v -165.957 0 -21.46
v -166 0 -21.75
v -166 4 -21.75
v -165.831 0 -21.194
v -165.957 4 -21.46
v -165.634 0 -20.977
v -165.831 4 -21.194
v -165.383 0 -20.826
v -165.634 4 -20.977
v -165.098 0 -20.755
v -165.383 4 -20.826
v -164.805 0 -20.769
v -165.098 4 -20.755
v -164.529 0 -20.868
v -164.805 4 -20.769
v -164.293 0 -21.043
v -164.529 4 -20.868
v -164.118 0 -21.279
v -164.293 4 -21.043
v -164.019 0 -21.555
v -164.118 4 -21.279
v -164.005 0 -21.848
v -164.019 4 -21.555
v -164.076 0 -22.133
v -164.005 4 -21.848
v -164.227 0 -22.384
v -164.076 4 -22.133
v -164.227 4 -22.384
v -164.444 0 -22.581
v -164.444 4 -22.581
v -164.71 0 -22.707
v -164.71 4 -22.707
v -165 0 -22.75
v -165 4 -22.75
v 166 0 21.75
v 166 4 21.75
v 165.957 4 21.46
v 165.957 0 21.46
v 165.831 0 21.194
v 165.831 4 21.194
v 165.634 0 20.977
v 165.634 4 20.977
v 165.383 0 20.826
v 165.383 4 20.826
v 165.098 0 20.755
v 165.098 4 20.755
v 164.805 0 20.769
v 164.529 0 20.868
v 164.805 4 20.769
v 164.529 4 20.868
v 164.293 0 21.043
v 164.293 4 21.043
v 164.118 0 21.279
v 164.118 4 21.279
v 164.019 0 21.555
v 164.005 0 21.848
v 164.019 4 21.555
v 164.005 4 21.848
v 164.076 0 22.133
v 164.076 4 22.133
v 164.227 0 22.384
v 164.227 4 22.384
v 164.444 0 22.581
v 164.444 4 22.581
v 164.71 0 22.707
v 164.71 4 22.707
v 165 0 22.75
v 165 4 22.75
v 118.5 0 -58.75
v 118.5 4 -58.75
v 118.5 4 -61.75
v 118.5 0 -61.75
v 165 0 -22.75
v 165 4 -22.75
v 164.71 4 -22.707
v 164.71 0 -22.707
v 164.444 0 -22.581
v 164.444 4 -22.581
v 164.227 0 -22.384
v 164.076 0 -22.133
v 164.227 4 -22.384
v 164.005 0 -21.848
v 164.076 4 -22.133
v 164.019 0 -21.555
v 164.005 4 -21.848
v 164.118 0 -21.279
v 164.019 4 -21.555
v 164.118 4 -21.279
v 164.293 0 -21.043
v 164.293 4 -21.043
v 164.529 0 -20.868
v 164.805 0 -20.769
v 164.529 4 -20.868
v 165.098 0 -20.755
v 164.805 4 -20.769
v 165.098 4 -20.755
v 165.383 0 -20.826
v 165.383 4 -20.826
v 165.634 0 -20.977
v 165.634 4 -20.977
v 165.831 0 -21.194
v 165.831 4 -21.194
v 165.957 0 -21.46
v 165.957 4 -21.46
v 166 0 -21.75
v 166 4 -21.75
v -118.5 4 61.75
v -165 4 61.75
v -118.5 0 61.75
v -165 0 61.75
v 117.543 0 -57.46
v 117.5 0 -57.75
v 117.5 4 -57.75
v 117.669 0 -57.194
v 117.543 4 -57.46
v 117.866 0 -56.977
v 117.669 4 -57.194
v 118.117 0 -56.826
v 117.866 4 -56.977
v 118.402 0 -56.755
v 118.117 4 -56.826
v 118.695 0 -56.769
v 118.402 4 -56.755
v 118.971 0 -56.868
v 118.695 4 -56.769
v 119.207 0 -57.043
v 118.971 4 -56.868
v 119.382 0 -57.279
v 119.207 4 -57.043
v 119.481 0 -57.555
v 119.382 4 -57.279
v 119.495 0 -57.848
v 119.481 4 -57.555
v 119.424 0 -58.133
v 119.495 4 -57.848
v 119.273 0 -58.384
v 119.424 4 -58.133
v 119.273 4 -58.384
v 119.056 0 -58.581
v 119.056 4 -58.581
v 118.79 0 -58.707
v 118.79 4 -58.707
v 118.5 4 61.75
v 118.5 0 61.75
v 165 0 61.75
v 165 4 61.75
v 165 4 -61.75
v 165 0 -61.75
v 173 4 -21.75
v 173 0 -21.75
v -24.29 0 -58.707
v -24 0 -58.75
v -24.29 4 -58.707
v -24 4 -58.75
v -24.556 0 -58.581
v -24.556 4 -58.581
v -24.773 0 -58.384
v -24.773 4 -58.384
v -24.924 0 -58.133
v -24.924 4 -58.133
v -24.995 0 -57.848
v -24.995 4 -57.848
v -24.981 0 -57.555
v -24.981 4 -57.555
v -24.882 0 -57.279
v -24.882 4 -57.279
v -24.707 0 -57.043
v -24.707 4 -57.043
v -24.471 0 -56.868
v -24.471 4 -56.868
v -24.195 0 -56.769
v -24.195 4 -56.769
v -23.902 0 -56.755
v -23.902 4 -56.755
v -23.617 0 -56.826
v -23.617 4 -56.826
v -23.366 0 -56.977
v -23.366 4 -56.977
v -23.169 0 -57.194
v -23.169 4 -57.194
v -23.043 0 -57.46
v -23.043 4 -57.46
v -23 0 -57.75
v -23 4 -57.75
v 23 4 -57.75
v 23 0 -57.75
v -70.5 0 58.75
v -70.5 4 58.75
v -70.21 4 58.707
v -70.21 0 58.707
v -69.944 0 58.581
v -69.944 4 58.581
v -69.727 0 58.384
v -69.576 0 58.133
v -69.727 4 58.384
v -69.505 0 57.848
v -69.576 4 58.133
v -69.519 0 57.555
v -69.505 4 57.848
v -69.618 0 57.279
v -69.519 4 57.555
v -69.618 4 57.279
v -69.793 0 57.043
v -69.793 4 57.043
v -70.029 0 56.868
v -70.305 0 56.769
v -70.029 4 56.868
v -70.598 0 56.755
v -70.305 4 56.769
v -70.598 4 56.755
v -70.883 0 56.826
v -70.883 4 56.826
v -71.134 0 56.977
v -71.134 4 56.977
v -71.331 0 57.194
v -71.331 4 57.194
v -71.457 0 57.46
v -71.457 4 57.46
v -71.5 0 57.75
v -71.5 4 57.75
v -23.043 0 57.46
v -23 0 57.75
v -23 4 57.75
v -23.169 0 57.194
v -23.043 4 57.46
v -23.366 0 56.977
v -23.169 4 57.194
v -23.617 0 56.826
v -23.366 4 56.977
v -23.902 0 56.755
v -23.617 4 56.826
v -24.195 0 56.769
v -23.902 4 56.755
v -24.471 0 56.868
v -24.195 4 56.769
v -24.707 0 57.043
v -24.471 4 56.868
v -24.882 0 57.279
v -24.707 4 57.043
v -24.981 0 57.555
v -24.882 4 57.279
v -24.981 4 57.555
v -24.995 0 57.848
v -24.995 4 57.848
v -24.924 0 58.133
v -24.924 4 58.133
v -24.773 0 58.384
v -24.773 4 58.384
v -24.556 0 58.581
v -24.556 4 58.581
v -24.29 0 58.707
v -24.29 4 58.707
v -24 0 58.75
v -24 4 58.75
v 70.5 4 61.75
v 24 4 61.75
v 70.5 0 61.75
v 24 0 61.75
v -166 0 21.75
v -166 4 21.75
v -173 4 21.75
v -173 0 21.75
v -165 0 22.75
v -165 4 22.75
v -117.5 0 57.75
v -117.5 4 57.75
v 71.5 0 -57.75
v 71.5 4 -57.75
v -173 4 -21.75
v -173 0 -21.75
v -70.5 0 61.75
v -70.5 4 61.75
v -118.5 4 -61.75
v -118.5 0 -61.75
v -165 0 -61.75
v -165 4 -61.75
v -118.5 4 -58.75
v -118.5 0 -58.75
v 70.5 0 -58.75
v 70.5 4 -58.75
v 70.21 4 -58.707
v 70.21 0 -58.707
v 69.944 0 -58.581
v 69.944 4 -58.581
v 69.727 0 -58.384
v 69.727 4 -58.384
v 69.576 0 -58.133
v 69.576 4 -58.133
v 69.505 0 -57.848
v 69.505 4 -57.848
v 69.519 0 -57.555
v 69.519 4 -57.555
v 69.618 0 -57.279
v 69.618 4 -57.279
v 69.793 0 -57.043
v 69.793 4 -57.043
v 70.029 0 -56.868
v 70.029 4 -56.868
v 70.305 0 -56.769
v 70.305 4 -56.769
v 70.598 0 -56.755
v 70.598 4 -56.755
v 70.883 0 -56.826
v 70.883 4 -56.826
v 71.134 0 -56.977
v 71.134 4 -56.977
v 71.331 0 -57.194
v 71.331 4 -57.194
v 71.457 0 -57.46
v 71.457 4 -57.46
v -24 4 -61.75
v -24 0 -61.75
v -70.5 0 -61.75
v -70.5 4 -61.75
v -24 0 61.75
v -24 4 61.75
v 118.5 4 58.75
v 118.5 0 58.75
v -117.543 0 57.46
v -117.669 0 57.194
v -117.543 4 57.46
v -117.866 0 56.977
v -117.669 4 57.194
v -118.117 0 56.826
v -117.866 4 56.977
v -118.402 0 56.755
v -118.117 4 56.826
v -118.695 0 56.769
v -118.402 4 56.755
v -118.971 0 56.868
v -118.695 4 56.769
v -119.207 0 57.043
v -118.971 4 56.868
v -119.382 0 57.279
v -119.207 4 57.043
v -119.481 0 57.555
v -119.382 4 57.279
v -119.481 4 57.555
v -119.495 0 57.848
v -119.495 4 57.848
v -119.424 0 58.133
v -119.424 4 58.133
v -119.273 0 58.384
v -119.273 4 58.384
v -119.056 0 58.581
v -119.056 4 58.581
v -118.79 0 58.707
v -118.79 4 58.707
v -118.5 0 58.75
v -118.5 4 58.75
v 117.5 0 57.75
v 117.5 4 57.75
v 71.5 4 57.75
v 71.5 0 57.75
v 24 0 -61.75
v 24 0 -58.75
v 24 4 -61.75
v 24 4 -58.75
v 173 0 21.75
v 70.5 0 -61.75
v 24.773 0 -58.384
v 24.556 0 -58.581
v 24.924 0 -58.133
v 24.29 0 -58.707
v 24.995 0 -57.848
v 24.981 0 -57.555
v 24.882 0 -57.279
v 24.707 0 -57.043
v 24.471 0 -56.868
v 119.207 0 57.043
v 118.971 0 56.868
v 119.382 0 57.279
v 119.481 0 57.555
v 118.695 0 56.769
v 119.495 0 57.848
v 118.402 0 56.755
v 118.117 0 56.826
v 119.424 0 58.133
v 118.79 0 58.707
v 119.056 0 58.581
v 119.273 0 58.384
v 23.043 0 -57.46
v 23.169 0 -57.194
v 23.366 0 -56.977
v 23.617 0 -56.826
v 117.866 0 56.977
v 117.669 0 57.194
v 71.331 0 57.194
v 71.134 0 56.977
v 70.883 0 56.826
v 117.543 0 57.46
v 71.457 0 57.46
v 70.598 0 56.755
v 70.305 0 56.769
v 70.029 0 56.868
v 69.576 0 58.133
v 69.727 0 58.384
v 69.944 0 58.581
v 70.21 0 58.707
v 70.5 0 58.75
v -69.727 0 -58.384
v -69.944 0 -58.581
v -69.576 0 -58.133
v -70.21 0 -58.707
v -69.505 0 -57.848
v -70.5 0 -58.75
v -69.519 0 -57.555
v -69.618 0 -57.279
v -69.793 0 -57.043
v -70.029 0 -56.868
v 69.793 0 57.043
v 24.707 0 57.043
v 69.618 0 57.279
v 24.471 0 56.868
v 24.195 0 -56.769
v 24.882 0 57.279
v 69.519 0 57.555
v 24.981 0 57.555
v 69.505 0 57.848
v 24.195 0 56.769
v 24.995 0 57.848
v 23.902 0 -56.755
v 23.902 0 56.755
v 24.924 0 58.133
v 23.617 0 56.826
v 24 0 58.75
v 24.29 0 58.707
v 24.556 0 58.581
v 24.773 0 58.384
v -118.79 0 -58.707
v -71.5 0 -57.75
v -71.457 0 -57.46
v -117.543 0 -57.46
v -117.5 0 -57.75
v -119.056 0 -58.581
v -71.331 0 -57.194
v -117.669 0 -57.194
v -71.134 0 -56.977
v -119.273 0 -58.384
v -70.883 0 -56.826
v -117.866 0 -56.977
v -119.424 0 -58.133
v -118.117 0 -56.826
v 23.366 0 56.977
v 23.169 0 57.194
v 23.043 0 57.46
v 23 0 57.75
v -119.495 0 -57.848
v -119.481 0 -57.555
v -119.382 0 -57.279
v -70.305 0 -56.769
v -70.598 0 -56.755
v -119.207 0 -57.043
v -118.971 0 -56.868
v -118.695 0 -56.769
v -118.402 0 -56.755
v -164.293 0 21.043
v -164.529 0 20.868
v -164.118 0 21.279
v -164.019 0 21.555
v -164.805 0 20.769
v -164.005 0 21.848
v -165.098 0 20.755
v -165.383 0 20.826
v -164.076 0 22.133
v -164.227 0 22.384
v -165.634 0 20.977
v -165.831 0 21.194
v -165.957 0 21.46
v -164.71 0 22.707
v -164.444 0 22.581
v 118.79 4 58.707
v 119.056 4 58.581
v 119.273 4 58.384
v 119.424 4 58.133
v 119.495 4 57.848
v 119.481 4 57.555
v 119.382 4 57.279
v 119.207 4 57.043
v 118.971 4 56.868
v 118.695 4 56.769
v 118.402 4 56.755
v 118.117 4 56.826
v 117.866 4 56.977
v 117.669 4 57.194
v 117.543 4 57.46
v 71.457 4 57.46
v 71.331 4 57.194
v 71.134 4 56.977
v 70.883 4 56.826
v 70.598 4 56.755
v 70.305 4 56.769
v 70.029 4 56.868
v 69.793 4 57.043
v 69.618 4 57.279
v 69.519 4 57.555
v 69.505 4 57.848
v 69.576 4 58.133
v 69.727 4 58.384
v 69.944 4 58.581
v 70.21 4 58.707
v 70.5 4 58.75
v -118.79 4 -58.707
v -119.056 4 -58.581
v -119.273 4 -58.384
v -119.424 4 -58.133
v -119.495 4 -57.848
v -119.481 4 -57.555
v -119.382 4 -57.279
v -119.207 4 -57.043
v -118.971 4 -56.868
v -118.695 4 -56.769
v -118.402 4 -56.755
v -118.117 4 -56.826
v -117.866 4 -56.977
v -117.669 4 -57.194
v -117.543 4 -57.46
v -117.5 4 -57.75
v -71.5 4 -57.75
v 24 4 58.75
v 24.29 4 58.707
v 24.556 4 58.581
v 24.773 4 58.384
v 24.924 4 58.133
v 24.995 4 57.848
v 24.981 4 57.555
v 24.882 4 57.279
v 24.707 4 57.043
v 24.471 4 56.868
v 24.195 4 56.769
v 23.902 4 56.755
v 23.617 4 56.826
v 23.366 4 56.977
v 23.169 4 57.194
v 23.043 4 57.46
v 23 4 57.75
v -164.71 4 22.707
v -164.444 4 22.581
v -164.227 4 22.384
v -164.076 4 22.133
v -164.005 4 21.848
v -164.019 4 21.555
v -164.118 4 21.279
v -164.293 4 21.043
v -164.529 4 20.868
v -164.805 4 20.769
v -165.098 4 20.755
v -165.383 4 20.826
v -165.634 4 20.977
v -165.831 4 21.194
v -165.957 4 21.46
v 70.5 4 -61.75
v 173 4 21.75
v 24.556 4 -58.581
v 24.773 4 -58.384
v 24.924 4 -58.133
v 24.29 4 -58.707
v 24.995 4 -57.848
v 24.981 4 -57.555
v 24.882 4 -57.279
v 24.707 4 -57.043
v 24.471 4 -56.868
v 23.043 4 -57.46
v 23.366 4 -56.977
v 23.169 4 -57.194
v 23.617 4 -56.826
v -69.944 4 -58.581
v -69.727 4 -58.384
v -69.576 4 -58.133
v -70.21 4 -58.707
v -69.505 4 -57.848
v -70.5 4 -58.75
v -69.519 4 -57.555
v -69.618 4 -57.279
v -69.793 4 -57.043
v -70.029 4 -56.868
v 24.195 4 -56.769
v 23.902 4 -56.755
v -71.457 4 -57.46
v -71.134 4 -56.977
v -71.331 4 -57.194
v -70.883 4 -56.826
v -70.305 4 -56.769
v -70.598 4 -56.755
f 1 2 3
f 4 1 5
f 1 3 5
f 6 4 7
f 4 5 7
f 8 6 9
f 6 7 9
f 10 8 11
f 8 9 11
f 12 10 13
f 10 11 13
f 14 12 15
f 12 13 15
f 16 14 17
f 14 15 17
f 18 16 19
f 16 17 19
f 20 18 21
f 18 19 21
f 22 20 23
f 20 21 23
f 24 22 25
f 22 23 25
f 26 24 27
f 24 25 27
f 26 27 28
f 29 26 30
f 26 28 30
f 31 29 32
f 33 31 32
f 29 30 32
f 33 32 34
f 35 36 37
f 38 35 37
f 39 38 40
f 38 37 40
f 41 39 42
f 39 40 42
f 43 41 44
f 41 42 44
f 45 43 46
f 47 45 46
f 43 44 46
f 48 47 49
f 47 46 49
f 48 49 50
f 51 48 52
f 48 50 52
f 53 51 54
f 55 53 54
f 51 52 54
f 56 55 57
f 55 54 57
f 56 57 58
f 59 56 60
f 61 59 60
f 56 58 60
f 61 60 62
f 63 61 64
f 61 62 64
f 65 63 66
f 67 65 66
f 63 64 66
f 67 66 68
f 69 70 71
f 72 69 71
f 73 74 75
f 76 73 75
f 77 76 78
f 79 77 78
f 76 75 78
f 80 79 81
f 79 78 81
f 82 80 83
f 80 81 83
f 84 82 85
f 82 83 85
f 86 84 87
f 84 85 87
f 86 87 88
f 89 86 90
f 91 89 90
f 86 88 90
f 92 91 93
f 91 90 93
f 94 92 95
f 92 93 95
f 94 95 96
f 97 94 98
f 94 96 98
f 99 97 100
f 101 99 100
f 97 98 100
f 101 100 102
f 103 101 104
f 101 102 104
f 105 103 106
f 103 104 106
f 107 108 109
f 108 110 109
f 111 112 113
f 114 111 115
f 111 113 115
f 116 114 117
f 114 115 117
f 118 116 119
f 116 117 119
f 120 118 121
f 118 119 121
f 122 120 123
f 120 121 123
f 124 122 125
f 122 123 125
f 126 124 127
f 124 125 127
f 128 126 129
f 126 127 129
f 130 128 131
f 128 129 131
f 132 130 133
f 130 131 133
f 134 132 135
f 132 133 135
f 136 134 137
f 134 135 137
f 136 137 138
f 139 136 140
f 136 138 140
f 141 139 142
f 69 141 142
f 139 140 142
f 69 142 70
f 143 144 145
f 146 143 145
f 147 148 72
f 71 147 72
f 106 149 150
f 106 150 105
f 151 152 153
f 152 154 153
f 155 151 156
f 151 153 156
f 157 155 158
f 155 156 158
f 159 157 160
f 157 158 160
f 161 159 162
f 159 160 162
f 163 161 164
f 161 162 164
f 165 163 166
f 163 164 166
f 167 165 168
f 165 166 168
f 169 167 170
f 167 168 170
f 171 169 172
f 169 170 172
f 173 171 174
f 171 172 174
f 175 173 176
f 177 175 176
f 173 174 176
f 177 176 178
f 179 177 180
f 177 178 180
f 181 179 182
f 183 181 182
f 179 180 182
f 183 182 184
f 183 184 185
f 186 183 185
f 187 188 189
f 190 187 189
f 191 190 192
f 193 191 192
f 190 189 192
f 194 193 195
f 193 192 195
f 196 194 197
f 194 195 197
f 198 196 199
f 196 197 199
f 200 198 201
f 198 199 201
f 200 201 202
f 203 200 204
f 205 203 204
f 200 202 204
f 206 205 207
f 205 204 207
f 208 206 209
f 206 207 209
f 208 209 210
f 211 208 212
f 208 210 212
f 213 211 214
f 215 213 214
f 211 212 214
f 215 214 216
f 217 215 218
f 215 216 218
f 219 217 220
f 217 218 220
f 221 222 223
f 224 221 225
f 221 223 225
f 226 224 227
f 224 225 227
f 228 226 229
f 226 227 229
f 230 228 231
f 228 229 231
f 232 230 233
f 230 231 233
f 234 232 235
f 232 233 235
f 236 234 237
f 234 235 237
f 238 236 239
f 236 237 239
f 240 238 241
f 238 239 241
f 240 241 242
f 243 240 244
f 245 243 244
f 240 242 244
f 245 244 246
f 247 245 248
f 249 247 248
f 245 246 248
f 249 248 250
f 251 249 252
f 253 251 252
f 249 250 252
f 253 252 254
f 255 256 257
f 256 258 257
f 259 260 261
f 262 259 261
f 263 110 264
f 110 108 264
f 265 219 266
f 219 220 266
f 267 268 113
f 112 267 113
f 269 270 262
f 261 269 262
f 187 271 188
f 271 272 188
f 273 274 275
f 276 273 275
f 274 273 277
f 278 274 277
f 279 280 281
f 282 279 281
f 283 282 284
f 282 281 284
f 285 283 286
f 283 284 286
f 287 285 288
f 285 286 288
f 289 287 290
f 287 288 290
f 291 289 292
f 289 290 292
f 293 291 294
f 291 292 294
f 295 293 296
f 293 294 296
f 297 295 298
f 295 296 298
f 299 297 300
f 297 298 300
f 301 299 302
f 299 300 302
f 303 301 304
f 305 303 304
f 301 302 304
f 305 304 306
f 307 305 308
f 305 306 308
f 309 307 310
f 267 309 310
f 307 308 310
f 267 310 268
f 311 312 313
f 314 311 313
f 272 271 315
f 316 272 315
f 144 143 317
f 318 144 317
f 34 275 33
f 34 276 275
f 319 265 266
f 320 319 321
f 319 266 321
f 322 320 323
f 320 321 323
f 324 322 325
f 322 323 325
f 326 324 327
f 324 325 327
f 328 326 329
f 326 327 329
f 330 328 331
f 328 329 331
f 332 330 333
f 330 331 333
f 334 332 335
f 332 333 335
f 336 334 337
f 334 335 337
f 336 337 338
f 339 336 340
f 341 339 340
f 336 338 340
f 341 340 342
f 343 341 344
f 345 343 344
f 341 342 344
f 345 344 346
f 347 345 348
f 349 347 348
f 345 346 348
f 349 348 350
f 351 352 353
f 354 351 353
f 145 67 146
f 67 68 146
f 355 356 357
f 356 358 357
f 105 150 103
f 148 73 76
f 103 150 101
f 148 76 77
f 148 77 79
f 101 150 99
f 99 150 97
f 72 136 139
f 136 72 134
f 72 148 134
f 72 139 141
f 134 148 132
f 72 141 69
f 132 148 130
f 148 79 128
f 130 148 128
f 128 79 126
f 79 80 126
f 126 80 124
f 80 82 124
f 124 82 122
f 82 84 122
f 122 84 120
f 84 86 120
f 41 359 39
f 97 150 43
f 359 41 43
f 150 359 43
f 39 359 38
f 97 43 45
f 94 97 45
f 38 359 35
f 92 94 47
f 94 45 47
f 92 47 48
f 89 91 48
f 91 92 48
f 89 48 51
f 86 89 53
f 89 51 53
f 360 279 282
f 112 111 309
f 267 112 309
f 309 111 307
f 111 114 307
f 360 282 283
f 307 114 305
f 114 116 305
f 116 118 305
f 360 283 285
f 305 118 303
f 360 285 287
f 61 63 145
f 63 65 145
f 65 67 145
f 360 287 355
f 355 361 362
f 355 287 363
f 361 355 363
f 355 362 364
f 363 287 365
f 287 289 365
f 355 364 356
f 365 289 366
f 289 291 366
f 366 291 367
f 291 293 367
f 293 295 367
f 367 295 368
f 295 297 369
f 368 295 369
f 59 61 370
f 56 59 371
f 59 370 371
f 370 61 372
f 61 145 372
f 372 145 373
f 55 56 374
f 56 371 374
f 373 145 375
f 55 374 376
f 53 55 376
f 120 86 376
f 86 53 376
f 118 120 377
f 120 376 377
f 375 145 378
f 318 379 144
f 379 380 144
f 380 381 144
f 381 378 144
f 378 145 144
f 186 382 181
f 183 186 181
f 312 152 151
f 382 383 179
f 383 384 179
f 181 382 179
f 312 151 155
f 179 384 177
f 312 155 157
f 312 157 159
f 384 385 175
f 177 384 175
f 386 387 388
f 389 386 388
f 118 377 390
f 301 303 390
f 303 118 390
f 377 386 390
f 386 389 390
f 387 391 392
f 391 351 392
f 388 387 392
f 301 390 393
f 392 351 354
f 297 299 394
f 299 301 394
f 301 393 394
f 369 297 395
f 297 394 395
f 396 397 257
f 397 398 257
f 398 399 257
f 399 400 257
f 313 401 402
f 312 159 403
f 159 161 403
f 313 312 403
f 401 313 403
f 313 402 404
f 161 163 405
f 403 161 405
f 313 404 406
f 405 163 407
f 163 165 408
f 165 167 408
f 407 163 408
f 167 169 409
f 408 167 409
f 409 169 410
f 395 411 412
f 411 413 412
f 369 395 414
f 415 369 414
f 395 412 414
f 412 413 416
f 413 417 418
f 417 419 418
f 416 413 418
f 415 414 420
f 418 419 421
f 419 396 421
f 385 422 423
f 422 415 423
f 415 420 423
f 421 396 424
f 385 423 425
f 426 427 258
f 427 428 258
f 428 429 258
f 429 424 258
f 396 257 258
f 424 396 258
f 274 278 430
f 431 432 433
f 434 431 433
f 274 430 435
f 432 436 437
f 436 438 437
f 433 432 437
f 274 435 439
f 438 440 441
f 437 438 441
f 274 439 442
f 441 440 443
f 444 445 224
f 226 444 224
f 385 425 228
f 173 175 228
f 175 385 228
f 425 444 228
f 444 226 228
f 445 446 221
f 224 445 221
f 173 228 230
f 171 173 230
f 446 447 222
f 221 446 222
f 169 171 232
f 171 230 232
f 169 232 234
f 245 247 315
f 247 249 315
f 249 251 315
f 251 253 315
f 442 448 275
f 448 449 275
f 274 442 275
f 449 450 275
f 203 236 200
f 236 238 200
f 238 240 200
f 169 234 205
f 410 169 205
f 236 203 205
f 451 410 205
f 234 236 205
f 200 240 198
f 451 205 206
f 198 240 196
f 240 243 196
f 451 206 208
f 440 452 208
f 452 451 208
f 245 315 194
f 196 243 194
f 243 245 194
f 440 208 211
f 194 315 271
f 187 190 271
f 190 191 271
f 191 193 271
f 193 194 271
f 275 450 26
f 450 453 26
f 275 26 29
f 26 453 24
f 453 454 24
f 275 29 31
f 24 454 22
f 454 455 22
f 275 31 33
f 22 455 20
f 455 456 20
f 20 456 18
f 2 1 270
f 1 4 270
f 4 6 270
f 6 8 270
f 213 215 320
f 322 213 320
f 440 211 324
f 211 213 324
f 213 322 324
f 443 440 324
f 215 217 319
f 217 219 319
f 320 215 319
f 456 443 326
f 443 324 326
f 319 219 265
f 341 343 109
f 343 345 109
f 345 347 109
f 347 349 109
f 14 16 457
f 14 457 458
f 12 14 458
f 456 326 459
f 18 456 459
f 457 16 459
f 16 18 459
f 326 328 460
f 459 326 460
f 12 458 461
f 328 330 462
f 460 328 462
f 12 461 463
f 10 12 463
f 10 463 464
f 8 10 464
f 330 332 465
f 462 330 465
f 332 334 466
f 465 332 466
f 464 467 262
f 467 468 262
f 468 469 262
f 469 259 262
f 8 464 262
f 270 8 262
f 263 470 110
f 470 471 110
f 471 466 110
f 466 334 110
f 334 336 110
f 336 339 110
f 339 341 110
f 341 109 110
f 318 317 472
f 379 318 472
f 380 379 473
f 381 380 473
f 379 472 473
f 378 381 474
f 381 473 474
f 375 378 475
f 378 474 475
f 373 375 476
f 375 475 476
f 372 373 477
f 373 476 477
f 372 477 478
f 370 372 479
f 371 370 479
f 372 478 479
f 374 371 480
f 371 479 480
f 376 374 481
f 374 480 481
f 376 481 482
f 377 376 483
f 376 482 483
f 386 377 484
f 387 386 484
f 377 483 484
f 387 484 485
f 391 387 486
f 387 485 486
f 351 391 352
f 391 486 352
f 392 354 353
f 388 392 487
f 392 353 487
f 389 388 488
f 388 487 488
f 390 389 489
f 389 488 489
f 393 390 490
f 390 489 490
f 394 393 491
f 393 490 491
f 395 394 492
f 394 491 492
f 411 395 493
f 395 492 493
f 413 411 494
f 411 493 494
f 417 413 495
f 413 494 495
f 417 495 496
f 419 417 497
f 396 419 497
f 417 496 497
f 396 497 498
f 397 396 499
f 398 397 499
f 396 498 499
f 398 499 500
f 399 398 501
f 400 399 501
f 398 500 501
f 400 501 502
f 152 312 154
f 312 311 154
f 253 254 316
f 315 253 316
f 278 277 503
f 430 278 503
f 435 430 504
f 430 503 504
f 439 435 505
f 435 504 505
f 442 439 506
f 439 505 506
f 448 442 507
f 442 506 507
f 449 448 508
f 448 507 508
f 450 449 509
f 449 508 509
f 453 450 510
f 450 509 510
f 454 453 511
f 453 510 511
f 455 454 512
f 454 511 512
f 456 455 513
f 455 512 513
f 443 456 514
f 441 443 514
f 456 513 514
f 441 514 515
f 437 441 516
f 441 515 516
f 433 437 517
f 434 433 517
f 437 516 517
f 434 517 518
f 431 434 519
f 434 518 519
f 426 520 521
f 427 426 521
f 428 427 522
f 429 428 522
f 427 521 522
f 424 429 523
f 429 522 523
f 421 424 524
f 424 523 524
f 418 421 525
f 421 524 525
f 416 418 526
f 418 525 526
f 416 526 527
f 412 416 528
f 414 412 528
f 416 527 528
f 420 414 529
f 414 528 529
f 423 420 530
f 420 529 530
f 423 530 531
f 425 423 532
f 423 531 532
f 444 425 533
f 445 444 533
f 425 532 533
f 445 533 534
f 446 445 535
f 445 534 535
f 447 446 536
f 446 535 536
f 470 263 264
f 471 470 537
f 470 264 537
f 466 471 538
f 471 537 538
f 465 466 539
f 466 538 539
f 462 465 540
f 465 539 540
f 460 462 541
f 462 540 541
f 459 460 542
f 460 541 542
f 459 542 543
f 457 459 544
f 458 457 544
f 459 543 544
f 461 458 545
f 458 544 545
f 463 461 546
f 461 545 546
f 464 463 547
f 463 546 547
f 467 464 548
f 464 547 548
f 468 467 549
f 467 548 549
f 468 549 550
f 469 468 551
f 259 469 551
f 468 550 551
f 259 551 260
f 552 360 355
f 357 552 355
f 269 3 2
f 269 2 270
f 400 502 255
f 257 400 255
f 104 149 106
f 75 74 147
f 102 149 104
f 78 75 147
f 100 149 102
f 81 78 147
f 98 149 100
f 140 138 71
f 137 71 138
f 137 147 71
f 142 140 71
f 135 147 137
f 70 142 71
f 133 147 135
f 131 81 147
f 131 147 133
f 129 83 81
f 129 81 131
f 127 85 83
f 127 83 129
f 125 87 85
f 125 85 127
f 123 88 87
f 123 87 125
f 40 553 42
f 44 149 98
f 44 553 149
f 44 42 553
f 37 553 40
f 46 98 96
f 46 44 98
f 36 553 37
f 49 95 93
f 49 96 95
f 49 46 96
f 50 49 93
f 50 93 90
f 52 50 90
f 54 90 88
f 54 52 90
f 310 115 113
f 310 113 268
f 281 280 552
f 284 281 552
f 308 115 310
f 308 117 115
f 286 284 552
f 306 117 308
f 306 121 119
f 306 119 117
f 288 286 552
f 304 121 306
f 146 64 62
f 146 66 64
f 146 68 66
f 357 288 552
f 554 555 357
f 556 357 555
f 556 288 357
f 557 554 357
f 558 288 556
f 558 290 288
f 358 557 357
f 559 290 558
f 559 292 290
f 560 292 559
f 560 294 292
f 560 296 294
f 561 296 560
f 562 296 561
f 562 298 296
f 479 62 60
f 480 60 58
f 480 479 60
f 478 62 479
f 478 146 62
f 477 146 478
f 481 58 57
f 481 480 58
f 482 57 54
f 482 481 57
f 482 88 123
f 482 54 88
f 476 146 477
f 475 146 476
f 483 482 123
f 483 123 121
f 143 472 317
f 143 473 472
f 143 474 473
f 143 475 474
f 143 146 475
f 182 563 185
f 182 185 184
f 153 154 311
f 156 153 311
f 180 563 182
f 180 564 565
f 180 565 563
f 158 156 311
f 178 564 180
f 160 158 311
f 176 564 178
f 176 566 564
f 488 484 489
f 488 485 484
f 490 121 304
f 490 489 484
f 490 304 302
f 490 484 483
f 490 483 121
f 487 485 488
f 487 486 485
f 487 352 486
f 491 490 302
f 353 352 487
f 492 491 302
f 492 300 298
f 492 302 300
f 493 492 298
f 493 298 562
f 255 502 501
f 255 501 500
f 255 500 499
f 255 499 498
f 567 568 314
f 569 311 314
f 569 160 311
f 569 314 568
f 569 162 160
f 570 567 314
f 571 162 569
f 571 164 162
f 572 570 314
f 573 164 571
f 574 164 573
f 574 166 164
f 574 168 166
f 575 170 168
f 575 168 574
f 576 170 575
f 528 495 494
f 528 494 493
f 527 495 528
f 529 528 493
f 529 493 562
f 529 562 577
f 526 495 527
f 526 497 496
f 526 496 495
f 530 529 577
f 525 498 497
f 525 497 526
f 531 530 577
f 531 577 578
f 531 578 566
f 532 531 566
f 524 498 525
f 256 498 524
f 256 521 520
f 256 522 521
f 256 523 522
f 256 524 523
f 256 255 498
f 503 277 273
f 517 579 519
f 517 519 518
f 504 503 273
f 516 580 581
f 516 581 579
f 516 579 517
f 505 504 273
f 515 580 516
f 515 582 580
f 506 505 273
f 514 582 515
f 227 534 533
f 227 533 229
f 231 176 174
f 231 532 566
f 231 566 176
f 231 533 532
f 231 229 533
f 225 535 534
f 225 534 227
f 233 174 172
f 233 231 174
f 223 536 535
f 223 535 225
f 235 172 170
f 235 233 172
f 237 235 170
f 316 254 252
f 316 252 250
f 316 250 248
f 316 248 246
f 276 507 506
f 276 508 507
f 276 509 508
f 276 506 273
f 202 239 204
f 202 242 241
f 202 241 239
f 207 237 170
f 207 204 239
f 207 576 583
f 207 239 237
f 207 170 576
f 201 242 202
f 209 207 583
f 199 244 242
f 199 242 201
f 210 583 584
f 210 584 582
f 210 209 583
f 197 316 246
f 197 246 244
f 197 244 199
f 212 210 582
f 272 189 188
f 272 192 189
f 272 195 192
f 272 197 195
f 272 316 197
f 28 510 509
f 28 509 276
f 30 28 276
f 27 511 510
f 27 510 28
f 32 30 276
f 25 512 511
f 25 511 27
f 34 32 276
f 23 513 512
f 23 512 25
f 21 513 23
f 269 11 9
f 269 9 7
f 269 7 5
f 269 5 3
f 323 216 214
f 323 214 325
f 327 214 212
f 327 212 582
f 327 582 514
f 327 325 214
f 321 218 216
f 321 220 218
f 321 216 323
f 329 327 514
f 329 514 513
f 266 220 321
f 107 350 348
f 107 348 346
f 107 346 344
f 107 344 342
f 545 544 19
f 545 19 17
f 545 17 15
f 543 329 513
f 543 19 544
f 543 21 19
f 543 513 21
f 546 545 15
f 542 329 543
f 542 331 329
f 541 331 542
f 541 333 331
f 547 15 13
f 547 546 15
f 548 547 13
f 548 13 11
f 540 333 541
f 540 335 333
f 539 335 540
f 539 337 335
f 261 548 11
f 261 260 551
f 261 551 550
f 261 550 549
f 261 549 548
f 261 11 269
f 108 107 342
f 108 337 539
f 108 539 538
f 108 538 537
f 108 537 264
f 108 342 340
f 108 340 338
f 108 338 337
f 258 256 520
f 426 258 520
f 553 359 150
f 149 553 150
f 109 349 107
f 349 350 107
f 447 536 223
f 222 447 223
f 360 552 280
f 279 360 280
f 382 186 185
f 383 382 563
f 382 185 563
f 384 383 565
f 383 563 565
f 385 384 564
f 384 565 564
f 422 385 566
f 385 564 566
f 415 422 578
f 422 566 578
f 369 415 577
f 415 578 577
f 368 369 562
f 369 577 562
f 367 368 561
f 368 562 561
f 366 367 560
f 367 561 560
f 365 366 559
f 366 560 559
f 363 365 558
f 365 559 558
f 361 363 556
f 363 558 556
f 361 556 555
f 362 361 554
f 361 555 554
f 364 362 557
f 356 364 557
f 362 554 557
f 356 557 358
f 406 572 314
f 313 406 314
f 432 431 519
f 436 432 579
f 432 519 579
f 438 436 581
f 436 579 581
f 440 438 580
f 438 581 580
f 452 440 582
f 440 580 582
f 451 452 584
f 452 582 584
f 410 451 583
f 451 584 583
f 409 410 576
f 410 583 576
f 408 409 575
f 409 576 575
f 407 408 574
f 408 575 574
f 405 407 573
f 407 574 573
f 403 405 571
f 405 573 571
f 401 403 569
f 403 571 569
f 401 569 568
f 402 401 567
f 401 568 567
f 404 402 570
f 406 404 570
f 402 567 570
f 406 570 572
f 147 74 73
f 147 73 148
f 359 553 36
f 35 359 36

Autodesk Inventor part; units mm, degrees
ref_plane "YZ Plane" through (0, 0, 0) normal (1, 0, 0) x (0, 1, 0)
ref_plane "XZ Plane" through (0, 0, 0) normal (0, 1, 0) x (-1, 0, 0)
ref_plane "XY Plane" through (0, 0, 0) normal (0, 0, 1) x (1, 0, 0)
sketch "Sketch1" plane through (0, 0, 0) normal (0, 1, 0) x (-1, 0, 0)
  line L0 (173, 61.75) -> (-173, 61.75)
  line L1 (-173, 61.75) -> (-173, -61.75)
  line L2 (-173, -61.75) -> (173, -61.75)
  line L3 (173, -61.75) -> (173, 61.75)
  point P0 (0, 0)
  point P1 (0, -61.75)
  point P2 (173, 0)
  dimension "d0" = 346
  dimension "d1" = 123.5
extrude "Extrusion1" add sketch "Sketch1" along normal blind 4
sketch "Esboço2" plane through (0, 4, 0) normal (0, 1, 0) x (1, 0, 0)
  line L0 (173, 61.75) -> (-173, 61.75) projected
  line L1 (118.5, 61.75) -> (70.5, 61.75)
  line L2 (70.5, 61.75) -> (70.5, 57.75)
  line L3 (70.5, 57.75) -> (118.5, 57.75)
  line L4 (118.5, 57.75) -> (118.5, 61.75)
  line L5 (173, -61.75) -> (173, 61.75) projected
  line L6 (24, 61.75) -> (-24, 61.75)
  line L7 (-24, 61.75) -> (-24, 57.75)
  line L8 (-24, 57.75) -> (24, 57.75)
  line L9 (24, 57.75) -> (24, 61.75)
  line L10 (-70.5, 61.75) -> (-118.5, 61.75)
  line L11 (-118.5, 61.75) -> (-118.5, 57.75)
  line L12 (-118.5, 57.75) -> (-70.5, 57.75)
  line L13 (-70.5, 57.75) -> (-70.5, 61.75)
  circle A0 centre (24, 57.75) radius 1
  circle A1 centre (70.5, 57.75) radius 1
  circle A2 centre (-24, 57.75) radius 1
  circle A3 centre (-70.5, 57.75) radius 1
  circle A4 centre (-118.5, 57.75) radius 1
  circle A5 centre (118.5, 57.75) radius 1
  point P0 (0, 0)
  dimension "d4" = 48
  dimension "d5" = 4
  dimension "d6" = 54.5
  dimension "d7" = 48
  dimension "d8" = 46.5
  dimension "d9" = 48
  dimension "d10" = 46.5
  dimension "d11" = 2
  dimension "d12" = 2
  dimension "d13" = 2
  dimension "d14" = 2
  dimension "d15" = 2
  dimension "d16" = 2
extrude "Extrusão2" cut sketch "Esboço2" against normal blind 10
mirror "Espelhamento1" about plane through (0, 0, 0) normal (0, 0, 1) of "Extrusão2"
sketch "Esboço3" plane through (0, 4, 0) normal (0, 1, 0) x (1, 0, 0)
  line L0 (-118.5, 61.75) -> (-173, 61.75) projected
  line L1 (-173, 61.75) -> (-165, 61.75)
  line L2 (-165, 61.75) -> (-165, 21.75)
  line L3 (-165, 21.75) -> (-173, 21.75)
  line L4 (-173, 21.75) -> (-173, 61.75)
  line L5 (-173, 61.75) -> (-173, -61.75) projected
  line L6 (-173, -61.75) -> (-165, -61.75)
  line L7 (-165, -61.75) -> (-165, -21.75)
  line L8 (-165, -21.75) -> (-173, -21.75)
  line L9 (-173, -21.75) -> (-173, -61.75)
  circle A0 centre (-165, 21.75) radius 1
  circle A1 centre (-165, -21.75) radius 1
  point P0 (0, 0)
  dimension "d19" = 8
  dimension "d20" = 40
  dimension "d21" = 40
  dimension "d22" = 43.5
  dimension "d23" = 2
  dimension "d24" = 2
extrude "Extrusão3" cut sketch "Esboço3" against normal blind 10
mirror "Espelhamento2" about plane through (0, 0, 0) normal (1, 0, 0) of "Extrusão3"
properties part number "fechamento superior"
